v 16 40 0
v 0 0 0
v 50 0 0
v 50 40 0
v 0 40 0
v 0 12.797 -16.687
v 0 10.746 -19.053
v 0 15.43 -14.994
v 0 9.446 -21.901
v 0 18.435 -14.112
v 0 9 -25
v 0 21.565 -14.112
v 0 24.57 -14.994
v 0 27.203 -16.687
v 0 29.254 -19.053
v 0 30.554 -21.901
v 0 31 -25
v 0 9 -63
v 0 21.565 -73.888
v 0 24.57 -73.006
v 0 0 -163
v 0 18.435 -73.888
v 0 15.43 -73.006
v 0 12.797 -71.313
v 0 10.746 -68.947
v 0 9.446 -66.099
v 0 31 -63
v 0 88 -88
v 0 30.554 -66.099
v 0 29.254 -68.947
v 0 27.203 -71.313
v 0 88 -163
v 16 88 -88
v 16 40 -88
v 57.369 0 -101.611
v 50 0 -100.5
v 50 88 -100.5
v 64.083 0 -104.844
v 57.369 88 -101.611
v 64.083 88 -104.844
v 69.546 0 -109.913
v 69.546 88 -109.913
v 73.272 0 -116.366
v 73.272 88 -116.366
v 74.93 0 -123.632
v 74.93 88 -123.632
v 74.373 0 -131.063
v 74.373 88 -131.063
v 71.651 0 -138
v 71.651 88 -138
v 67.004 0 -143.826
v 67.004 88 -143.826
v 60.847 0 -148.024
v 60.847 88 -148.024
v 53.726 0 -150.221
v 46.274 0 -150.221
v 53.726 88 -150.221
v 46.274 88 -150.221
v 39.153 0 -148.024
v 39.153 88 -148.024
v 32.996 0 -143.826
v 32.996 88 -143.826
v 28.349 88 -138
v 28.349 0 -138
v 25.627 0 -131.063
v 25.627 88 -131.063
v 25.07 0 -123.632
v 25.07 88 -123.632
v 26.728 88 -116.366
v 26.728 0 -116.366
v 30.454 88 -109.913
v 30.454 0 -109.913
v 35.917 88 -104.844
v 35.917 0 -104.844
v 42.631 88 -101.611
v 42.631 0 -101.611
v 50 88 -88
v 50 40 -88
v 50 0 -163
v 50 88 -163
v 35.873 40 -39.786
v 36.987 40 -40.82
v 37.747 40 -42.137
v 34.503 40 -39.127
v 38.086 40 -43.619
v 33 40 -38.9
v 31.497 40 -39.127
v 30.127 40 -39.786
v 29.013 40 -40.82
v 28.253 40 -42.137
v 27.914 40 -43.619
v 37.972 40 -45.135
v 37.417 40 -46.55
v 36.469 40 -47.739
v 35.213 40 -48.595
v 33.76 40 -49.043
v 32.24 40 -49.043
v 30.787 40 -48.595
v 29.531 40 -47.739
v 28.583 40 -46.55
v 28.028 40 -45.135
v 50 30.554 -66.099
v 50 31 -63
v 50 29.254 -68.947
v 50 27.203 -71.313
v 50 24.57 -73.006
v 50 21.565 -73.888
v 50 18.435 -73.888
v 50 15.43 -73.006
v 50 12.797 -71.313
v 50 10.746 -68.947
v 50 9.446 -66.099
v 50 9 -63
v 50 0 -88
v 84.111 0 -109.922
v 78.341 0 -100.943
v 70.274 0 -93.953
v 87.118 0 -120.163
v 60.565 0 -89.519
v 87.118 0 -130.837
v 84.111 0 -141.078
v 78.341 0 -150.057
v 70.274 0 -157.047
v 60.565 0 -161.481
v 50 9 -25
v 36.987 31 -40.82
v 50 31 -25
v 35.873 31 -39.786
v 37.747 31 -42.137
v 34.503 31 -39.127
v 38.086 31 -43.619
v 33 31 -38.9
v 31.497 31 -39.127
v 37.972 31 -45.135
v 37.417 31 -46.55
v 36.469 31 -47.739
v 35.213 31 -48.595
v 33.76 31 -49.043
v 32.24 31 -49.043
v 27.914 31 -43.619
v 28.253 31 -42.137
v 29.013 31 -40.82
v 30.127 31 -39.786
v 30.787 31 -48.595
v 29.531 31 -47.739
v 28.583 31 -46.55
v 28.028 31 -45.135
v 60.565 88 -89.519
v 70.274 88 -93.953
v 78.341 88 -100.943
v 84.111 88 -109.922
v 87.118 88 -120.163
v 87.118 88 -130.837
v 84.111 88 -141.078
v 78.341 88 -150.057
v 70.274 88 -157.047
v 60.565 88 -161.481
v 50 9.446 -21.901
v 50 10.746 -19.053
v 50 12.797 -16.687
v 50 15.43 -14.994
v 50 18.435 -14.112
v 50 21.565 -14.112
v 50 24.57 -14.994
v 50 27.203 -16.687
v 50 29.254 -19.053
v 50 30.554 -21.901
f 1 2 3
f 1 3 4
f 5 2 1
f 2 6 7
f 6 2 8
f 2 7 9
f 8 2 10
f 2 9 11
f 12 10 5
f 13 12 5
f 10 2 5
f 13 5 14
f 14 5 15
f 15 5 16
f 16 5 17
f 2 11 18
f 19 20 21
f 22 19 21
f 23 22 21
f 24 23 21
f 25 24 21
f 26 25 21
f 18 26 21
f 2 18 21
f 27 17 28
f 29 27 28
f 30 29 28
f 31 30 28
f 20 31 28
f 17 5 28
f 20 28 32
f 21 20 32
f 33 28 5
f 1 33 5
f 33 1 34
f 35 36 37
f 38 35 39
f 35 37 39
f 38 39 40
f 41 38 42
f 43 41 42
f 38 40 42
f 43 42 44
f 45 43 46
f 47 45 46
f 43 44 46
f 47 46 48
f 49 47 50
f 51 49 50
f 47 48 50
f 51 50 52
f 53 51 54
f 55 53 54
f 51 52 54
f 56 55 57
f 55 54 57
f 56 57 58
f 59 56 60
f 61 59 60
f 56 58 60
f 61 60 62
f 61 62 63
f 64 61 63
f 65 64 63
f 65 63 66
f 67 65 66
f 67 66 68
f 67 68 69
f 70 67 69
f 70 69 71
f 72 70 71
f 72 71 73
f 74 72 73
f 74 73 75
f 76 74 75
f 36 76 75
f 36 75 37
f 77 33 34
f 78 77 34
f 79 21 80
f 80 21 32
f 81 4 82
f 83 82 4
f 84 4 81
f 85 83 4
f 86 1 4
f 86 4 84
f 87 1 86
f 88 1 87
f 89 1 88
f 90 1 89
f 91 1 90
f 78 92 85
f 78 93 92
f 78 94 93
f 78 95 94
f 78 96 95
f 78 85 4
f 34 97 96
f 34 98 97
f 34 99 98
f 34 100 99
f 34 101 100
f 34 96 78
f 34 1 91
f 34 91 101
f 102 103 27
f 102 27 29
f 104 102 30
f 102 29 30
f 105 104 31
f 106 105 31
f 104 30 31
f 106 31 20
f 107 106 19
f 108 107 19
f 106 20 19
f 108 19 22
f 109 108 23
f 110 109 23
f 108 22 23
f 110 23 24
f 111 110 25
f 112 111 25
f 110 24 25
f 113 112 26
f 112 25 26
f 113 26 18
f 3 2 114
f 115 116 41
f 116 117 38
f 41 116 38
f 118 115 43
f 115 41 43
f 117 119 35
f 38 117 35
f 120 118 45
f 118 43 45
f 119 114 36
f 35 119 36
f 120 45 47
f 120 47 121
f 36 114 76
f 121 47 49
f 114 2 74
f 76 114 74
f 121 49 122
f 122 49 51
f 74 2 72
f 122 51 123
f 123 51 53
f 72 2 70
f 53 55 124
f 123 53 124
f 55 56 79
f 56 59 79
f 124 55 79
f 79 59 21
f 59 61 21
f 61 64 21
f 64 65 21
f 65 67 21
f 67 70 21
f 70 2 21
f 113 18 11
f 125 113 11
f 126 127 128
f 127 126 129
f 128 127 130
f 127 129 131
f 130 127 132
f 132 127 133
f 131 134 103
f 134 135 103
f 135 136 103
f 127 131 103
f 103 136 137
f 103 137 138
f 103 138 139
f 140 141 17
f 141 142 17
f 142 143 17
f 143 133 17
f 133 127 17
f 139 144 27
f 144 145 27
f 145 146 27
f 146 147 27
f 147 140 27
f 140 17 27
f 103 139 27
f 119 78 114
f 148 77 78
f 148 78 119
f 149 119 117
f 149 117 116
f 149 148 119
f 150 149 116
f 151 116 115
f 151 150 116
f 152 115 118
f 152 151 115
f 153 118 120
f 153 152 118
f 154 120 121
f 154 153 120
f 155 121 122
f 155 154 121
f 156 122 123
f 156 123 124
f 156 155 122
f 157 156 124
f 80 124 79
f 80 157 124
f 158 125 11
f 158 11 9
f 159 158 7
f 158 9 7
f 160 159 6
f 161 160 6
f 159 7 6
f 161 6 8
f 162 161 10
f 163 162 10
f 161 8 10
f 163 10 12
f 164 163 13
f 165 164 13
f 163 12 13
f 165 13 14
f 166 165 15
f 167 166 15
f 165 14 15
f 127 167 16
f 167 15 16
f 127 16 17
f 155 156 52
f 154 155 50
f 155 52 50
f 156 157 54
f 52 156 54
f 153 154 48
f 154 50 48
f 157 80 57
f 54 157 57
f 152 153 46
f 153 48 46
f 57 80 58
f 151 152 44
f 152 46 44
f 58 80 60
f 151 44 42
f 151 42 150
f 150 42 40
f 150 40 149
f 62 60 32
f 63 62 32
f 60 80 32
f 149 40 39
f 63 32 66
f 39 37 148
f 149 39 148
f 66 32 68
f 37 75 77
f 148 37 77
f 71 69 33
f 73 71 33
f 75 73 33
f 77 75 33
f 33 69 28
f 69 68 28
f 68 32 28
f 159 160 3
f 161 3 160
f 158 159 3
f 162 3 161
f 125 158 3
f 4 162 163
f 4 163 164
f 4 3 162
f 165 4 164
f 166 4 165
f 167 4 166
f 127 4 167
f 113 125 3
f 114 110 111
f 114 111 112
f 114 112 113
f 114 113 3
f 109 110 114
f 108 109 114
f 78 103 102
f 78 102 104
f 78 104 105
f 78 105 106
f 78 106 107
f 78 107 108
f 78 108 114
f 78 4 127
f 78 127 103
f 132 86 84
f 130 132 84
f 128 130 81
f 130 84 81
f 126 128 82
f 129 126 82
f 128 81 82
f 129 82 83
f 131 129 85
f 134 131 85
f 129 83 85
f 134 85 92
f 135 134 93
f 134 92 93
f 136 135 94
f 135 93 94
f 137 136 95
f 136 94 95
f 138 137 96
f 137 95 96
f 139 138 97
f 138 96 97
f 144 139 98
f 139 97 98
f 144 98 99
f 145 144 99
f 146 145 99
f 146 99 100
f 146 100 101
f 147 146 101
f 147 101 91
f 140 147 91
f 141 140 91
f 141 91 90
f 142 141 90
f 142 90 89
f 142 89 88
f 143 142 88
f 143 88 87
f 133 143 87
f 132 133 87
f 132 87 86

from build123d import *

# Parameters (mm, degrees)
BOSS_EXTRUDE1_DEPTH = 87.5
SKETCH1_3_W         = 88
SKETCH1_3_H         = 40
BOSS_EXTRUDE2_DEPTH = 50
BOSS_EXTRUDE3_DEPTH = 16
FILLET1_RADIUS      = 37.5
FILLET1_LENGTH      = 88
CUT_EXTRUDE1_REACH  = 206.864
SKETCH4_R           = 25
SKETCH4_R_2         = 5.1


with BuildPart() as part:
    # Sketch1 → Boss-Extrude1 (new body)
    with BuildSketch(Plane(origin=(0, 0, 0), x_dir=(0, 0, -1), z_dir=(1, 0, 0))):
        Polygon((88, 40), (88, 0), (163, 0), (163, 88), (88, 88), align=None)
    extrude(amount=BOSS_EXTRUDE1_DEPTH)

    # Sketch1<3> → Boss-Extrude2 (add)
    with BuildSketch(Plane(origin=(0, 0, 0), x_dir=(0, 0, -1), z_dir=(1, 0, 0))):
        with Locations((44, 20)):
            Rectangle(SKETCH1_3_W, SKETCH1_3_H)
        with BuildLine():
            ThreePointArc((25, 9), (14, 20), (25, 31))
            Line((25, 31), (63, 31))
            ThreePointArc((63, 31), (74, 20), (63, 9))
            Line((63, 9), (25, 9))
        make_face(mode=Mode.SUBTRACT)
    extrude(amount=BOSS_EXTRUDE2_DEPTH)

    # Sketch1<4> → Boss-Extrude3 (add)
    with BuildSketch(Plane(origin=(0, 0, 0), x_dir=(0, 0, -1), z_dir=(1, 0, 0))):
        Polygon((88, 88), (0, 40), (88, 40), align=None)
    extrude(amount=BOSS_EXTRUDE3_DEPTH)

    # Fillet1: full round fillet: the end face becomes a half cylinder, R = half its width
    fillet1_face = Plane((87.5, 44, -125.5), x_dir=(0, 1, 0), z_dir=(1, 0, 0))  # on the end face: x along it, z out of the body
    fillet1_slab = fillet1_face.offset(-FILLET1_RADIUS / 2) * Box(FILLET1_LENGTH, 2 * FILLET1_RADIUS, FILLET1_RADIUS, mode=Mode.PRIVATE)  # the body's end, R deep
    fillet1_round = Plane((50, 44, -125.5), x_dir=(1, 0, 0), z_dir=(0, 1, 0)) * Cylinder(FILLET1_RADIUS, FILLET1_LENGTH, mode=Mode.PRIVATE)  # its axis R under the face
    add(fillet1_slab - fillet1_round, mode=Mode.SUBTRACT)

    # Sketch4 → Cut-Extrude1 (cut, up to next)
    with BuildSketch(Plane(origin=(0, 88, 0), x_dir=(1, 0, 0), z_dir=(0, 1, 0)), mode=Mode.PRIVATE) as cut_extrude1_sk1:
        with Locations(Location((50, 125.5, 0), (0, 0, 270))):
            Circle(SKETCH4_R)
    cut_extrude1_tool1 = extrude(cut_extrude1_sk1.sketch, amount=-CUT_EXTRUDE1_REACH, mode=Mode.PRIVATE) & part.part
    # Sketch4 → Cut-Extrude1 (cut, up to next)
    with BuildSketch(Plane(origin=(0, 88, 0), x_dir=(1, 0, 0), z_dir=(0, 1, 0)), mode=Mode.PRIVATE) as cut_extrude1_sk2:
        with Locations(Location((33, 44, 0), (0, 0, 270))):
            Circle(SKETCH4_R_2)
    cut_extrude1_tool2 = extrude(cut_extrude1_sk2.sketch, amount=-CUT_EXTRUDE1_REACH, mode=Mode.PRIVATE) & part.part
    add(cut_extrude1_tool1.solids().sort_by_distance((50, 88, -125.5))[0], mode=Mode.SUBTRACT)
    add(cut_extrude1_tool2.solids().sort_by_distance((33, 88, -44))[0], mode=Mode.SUBTRACT)


solid = part.part
